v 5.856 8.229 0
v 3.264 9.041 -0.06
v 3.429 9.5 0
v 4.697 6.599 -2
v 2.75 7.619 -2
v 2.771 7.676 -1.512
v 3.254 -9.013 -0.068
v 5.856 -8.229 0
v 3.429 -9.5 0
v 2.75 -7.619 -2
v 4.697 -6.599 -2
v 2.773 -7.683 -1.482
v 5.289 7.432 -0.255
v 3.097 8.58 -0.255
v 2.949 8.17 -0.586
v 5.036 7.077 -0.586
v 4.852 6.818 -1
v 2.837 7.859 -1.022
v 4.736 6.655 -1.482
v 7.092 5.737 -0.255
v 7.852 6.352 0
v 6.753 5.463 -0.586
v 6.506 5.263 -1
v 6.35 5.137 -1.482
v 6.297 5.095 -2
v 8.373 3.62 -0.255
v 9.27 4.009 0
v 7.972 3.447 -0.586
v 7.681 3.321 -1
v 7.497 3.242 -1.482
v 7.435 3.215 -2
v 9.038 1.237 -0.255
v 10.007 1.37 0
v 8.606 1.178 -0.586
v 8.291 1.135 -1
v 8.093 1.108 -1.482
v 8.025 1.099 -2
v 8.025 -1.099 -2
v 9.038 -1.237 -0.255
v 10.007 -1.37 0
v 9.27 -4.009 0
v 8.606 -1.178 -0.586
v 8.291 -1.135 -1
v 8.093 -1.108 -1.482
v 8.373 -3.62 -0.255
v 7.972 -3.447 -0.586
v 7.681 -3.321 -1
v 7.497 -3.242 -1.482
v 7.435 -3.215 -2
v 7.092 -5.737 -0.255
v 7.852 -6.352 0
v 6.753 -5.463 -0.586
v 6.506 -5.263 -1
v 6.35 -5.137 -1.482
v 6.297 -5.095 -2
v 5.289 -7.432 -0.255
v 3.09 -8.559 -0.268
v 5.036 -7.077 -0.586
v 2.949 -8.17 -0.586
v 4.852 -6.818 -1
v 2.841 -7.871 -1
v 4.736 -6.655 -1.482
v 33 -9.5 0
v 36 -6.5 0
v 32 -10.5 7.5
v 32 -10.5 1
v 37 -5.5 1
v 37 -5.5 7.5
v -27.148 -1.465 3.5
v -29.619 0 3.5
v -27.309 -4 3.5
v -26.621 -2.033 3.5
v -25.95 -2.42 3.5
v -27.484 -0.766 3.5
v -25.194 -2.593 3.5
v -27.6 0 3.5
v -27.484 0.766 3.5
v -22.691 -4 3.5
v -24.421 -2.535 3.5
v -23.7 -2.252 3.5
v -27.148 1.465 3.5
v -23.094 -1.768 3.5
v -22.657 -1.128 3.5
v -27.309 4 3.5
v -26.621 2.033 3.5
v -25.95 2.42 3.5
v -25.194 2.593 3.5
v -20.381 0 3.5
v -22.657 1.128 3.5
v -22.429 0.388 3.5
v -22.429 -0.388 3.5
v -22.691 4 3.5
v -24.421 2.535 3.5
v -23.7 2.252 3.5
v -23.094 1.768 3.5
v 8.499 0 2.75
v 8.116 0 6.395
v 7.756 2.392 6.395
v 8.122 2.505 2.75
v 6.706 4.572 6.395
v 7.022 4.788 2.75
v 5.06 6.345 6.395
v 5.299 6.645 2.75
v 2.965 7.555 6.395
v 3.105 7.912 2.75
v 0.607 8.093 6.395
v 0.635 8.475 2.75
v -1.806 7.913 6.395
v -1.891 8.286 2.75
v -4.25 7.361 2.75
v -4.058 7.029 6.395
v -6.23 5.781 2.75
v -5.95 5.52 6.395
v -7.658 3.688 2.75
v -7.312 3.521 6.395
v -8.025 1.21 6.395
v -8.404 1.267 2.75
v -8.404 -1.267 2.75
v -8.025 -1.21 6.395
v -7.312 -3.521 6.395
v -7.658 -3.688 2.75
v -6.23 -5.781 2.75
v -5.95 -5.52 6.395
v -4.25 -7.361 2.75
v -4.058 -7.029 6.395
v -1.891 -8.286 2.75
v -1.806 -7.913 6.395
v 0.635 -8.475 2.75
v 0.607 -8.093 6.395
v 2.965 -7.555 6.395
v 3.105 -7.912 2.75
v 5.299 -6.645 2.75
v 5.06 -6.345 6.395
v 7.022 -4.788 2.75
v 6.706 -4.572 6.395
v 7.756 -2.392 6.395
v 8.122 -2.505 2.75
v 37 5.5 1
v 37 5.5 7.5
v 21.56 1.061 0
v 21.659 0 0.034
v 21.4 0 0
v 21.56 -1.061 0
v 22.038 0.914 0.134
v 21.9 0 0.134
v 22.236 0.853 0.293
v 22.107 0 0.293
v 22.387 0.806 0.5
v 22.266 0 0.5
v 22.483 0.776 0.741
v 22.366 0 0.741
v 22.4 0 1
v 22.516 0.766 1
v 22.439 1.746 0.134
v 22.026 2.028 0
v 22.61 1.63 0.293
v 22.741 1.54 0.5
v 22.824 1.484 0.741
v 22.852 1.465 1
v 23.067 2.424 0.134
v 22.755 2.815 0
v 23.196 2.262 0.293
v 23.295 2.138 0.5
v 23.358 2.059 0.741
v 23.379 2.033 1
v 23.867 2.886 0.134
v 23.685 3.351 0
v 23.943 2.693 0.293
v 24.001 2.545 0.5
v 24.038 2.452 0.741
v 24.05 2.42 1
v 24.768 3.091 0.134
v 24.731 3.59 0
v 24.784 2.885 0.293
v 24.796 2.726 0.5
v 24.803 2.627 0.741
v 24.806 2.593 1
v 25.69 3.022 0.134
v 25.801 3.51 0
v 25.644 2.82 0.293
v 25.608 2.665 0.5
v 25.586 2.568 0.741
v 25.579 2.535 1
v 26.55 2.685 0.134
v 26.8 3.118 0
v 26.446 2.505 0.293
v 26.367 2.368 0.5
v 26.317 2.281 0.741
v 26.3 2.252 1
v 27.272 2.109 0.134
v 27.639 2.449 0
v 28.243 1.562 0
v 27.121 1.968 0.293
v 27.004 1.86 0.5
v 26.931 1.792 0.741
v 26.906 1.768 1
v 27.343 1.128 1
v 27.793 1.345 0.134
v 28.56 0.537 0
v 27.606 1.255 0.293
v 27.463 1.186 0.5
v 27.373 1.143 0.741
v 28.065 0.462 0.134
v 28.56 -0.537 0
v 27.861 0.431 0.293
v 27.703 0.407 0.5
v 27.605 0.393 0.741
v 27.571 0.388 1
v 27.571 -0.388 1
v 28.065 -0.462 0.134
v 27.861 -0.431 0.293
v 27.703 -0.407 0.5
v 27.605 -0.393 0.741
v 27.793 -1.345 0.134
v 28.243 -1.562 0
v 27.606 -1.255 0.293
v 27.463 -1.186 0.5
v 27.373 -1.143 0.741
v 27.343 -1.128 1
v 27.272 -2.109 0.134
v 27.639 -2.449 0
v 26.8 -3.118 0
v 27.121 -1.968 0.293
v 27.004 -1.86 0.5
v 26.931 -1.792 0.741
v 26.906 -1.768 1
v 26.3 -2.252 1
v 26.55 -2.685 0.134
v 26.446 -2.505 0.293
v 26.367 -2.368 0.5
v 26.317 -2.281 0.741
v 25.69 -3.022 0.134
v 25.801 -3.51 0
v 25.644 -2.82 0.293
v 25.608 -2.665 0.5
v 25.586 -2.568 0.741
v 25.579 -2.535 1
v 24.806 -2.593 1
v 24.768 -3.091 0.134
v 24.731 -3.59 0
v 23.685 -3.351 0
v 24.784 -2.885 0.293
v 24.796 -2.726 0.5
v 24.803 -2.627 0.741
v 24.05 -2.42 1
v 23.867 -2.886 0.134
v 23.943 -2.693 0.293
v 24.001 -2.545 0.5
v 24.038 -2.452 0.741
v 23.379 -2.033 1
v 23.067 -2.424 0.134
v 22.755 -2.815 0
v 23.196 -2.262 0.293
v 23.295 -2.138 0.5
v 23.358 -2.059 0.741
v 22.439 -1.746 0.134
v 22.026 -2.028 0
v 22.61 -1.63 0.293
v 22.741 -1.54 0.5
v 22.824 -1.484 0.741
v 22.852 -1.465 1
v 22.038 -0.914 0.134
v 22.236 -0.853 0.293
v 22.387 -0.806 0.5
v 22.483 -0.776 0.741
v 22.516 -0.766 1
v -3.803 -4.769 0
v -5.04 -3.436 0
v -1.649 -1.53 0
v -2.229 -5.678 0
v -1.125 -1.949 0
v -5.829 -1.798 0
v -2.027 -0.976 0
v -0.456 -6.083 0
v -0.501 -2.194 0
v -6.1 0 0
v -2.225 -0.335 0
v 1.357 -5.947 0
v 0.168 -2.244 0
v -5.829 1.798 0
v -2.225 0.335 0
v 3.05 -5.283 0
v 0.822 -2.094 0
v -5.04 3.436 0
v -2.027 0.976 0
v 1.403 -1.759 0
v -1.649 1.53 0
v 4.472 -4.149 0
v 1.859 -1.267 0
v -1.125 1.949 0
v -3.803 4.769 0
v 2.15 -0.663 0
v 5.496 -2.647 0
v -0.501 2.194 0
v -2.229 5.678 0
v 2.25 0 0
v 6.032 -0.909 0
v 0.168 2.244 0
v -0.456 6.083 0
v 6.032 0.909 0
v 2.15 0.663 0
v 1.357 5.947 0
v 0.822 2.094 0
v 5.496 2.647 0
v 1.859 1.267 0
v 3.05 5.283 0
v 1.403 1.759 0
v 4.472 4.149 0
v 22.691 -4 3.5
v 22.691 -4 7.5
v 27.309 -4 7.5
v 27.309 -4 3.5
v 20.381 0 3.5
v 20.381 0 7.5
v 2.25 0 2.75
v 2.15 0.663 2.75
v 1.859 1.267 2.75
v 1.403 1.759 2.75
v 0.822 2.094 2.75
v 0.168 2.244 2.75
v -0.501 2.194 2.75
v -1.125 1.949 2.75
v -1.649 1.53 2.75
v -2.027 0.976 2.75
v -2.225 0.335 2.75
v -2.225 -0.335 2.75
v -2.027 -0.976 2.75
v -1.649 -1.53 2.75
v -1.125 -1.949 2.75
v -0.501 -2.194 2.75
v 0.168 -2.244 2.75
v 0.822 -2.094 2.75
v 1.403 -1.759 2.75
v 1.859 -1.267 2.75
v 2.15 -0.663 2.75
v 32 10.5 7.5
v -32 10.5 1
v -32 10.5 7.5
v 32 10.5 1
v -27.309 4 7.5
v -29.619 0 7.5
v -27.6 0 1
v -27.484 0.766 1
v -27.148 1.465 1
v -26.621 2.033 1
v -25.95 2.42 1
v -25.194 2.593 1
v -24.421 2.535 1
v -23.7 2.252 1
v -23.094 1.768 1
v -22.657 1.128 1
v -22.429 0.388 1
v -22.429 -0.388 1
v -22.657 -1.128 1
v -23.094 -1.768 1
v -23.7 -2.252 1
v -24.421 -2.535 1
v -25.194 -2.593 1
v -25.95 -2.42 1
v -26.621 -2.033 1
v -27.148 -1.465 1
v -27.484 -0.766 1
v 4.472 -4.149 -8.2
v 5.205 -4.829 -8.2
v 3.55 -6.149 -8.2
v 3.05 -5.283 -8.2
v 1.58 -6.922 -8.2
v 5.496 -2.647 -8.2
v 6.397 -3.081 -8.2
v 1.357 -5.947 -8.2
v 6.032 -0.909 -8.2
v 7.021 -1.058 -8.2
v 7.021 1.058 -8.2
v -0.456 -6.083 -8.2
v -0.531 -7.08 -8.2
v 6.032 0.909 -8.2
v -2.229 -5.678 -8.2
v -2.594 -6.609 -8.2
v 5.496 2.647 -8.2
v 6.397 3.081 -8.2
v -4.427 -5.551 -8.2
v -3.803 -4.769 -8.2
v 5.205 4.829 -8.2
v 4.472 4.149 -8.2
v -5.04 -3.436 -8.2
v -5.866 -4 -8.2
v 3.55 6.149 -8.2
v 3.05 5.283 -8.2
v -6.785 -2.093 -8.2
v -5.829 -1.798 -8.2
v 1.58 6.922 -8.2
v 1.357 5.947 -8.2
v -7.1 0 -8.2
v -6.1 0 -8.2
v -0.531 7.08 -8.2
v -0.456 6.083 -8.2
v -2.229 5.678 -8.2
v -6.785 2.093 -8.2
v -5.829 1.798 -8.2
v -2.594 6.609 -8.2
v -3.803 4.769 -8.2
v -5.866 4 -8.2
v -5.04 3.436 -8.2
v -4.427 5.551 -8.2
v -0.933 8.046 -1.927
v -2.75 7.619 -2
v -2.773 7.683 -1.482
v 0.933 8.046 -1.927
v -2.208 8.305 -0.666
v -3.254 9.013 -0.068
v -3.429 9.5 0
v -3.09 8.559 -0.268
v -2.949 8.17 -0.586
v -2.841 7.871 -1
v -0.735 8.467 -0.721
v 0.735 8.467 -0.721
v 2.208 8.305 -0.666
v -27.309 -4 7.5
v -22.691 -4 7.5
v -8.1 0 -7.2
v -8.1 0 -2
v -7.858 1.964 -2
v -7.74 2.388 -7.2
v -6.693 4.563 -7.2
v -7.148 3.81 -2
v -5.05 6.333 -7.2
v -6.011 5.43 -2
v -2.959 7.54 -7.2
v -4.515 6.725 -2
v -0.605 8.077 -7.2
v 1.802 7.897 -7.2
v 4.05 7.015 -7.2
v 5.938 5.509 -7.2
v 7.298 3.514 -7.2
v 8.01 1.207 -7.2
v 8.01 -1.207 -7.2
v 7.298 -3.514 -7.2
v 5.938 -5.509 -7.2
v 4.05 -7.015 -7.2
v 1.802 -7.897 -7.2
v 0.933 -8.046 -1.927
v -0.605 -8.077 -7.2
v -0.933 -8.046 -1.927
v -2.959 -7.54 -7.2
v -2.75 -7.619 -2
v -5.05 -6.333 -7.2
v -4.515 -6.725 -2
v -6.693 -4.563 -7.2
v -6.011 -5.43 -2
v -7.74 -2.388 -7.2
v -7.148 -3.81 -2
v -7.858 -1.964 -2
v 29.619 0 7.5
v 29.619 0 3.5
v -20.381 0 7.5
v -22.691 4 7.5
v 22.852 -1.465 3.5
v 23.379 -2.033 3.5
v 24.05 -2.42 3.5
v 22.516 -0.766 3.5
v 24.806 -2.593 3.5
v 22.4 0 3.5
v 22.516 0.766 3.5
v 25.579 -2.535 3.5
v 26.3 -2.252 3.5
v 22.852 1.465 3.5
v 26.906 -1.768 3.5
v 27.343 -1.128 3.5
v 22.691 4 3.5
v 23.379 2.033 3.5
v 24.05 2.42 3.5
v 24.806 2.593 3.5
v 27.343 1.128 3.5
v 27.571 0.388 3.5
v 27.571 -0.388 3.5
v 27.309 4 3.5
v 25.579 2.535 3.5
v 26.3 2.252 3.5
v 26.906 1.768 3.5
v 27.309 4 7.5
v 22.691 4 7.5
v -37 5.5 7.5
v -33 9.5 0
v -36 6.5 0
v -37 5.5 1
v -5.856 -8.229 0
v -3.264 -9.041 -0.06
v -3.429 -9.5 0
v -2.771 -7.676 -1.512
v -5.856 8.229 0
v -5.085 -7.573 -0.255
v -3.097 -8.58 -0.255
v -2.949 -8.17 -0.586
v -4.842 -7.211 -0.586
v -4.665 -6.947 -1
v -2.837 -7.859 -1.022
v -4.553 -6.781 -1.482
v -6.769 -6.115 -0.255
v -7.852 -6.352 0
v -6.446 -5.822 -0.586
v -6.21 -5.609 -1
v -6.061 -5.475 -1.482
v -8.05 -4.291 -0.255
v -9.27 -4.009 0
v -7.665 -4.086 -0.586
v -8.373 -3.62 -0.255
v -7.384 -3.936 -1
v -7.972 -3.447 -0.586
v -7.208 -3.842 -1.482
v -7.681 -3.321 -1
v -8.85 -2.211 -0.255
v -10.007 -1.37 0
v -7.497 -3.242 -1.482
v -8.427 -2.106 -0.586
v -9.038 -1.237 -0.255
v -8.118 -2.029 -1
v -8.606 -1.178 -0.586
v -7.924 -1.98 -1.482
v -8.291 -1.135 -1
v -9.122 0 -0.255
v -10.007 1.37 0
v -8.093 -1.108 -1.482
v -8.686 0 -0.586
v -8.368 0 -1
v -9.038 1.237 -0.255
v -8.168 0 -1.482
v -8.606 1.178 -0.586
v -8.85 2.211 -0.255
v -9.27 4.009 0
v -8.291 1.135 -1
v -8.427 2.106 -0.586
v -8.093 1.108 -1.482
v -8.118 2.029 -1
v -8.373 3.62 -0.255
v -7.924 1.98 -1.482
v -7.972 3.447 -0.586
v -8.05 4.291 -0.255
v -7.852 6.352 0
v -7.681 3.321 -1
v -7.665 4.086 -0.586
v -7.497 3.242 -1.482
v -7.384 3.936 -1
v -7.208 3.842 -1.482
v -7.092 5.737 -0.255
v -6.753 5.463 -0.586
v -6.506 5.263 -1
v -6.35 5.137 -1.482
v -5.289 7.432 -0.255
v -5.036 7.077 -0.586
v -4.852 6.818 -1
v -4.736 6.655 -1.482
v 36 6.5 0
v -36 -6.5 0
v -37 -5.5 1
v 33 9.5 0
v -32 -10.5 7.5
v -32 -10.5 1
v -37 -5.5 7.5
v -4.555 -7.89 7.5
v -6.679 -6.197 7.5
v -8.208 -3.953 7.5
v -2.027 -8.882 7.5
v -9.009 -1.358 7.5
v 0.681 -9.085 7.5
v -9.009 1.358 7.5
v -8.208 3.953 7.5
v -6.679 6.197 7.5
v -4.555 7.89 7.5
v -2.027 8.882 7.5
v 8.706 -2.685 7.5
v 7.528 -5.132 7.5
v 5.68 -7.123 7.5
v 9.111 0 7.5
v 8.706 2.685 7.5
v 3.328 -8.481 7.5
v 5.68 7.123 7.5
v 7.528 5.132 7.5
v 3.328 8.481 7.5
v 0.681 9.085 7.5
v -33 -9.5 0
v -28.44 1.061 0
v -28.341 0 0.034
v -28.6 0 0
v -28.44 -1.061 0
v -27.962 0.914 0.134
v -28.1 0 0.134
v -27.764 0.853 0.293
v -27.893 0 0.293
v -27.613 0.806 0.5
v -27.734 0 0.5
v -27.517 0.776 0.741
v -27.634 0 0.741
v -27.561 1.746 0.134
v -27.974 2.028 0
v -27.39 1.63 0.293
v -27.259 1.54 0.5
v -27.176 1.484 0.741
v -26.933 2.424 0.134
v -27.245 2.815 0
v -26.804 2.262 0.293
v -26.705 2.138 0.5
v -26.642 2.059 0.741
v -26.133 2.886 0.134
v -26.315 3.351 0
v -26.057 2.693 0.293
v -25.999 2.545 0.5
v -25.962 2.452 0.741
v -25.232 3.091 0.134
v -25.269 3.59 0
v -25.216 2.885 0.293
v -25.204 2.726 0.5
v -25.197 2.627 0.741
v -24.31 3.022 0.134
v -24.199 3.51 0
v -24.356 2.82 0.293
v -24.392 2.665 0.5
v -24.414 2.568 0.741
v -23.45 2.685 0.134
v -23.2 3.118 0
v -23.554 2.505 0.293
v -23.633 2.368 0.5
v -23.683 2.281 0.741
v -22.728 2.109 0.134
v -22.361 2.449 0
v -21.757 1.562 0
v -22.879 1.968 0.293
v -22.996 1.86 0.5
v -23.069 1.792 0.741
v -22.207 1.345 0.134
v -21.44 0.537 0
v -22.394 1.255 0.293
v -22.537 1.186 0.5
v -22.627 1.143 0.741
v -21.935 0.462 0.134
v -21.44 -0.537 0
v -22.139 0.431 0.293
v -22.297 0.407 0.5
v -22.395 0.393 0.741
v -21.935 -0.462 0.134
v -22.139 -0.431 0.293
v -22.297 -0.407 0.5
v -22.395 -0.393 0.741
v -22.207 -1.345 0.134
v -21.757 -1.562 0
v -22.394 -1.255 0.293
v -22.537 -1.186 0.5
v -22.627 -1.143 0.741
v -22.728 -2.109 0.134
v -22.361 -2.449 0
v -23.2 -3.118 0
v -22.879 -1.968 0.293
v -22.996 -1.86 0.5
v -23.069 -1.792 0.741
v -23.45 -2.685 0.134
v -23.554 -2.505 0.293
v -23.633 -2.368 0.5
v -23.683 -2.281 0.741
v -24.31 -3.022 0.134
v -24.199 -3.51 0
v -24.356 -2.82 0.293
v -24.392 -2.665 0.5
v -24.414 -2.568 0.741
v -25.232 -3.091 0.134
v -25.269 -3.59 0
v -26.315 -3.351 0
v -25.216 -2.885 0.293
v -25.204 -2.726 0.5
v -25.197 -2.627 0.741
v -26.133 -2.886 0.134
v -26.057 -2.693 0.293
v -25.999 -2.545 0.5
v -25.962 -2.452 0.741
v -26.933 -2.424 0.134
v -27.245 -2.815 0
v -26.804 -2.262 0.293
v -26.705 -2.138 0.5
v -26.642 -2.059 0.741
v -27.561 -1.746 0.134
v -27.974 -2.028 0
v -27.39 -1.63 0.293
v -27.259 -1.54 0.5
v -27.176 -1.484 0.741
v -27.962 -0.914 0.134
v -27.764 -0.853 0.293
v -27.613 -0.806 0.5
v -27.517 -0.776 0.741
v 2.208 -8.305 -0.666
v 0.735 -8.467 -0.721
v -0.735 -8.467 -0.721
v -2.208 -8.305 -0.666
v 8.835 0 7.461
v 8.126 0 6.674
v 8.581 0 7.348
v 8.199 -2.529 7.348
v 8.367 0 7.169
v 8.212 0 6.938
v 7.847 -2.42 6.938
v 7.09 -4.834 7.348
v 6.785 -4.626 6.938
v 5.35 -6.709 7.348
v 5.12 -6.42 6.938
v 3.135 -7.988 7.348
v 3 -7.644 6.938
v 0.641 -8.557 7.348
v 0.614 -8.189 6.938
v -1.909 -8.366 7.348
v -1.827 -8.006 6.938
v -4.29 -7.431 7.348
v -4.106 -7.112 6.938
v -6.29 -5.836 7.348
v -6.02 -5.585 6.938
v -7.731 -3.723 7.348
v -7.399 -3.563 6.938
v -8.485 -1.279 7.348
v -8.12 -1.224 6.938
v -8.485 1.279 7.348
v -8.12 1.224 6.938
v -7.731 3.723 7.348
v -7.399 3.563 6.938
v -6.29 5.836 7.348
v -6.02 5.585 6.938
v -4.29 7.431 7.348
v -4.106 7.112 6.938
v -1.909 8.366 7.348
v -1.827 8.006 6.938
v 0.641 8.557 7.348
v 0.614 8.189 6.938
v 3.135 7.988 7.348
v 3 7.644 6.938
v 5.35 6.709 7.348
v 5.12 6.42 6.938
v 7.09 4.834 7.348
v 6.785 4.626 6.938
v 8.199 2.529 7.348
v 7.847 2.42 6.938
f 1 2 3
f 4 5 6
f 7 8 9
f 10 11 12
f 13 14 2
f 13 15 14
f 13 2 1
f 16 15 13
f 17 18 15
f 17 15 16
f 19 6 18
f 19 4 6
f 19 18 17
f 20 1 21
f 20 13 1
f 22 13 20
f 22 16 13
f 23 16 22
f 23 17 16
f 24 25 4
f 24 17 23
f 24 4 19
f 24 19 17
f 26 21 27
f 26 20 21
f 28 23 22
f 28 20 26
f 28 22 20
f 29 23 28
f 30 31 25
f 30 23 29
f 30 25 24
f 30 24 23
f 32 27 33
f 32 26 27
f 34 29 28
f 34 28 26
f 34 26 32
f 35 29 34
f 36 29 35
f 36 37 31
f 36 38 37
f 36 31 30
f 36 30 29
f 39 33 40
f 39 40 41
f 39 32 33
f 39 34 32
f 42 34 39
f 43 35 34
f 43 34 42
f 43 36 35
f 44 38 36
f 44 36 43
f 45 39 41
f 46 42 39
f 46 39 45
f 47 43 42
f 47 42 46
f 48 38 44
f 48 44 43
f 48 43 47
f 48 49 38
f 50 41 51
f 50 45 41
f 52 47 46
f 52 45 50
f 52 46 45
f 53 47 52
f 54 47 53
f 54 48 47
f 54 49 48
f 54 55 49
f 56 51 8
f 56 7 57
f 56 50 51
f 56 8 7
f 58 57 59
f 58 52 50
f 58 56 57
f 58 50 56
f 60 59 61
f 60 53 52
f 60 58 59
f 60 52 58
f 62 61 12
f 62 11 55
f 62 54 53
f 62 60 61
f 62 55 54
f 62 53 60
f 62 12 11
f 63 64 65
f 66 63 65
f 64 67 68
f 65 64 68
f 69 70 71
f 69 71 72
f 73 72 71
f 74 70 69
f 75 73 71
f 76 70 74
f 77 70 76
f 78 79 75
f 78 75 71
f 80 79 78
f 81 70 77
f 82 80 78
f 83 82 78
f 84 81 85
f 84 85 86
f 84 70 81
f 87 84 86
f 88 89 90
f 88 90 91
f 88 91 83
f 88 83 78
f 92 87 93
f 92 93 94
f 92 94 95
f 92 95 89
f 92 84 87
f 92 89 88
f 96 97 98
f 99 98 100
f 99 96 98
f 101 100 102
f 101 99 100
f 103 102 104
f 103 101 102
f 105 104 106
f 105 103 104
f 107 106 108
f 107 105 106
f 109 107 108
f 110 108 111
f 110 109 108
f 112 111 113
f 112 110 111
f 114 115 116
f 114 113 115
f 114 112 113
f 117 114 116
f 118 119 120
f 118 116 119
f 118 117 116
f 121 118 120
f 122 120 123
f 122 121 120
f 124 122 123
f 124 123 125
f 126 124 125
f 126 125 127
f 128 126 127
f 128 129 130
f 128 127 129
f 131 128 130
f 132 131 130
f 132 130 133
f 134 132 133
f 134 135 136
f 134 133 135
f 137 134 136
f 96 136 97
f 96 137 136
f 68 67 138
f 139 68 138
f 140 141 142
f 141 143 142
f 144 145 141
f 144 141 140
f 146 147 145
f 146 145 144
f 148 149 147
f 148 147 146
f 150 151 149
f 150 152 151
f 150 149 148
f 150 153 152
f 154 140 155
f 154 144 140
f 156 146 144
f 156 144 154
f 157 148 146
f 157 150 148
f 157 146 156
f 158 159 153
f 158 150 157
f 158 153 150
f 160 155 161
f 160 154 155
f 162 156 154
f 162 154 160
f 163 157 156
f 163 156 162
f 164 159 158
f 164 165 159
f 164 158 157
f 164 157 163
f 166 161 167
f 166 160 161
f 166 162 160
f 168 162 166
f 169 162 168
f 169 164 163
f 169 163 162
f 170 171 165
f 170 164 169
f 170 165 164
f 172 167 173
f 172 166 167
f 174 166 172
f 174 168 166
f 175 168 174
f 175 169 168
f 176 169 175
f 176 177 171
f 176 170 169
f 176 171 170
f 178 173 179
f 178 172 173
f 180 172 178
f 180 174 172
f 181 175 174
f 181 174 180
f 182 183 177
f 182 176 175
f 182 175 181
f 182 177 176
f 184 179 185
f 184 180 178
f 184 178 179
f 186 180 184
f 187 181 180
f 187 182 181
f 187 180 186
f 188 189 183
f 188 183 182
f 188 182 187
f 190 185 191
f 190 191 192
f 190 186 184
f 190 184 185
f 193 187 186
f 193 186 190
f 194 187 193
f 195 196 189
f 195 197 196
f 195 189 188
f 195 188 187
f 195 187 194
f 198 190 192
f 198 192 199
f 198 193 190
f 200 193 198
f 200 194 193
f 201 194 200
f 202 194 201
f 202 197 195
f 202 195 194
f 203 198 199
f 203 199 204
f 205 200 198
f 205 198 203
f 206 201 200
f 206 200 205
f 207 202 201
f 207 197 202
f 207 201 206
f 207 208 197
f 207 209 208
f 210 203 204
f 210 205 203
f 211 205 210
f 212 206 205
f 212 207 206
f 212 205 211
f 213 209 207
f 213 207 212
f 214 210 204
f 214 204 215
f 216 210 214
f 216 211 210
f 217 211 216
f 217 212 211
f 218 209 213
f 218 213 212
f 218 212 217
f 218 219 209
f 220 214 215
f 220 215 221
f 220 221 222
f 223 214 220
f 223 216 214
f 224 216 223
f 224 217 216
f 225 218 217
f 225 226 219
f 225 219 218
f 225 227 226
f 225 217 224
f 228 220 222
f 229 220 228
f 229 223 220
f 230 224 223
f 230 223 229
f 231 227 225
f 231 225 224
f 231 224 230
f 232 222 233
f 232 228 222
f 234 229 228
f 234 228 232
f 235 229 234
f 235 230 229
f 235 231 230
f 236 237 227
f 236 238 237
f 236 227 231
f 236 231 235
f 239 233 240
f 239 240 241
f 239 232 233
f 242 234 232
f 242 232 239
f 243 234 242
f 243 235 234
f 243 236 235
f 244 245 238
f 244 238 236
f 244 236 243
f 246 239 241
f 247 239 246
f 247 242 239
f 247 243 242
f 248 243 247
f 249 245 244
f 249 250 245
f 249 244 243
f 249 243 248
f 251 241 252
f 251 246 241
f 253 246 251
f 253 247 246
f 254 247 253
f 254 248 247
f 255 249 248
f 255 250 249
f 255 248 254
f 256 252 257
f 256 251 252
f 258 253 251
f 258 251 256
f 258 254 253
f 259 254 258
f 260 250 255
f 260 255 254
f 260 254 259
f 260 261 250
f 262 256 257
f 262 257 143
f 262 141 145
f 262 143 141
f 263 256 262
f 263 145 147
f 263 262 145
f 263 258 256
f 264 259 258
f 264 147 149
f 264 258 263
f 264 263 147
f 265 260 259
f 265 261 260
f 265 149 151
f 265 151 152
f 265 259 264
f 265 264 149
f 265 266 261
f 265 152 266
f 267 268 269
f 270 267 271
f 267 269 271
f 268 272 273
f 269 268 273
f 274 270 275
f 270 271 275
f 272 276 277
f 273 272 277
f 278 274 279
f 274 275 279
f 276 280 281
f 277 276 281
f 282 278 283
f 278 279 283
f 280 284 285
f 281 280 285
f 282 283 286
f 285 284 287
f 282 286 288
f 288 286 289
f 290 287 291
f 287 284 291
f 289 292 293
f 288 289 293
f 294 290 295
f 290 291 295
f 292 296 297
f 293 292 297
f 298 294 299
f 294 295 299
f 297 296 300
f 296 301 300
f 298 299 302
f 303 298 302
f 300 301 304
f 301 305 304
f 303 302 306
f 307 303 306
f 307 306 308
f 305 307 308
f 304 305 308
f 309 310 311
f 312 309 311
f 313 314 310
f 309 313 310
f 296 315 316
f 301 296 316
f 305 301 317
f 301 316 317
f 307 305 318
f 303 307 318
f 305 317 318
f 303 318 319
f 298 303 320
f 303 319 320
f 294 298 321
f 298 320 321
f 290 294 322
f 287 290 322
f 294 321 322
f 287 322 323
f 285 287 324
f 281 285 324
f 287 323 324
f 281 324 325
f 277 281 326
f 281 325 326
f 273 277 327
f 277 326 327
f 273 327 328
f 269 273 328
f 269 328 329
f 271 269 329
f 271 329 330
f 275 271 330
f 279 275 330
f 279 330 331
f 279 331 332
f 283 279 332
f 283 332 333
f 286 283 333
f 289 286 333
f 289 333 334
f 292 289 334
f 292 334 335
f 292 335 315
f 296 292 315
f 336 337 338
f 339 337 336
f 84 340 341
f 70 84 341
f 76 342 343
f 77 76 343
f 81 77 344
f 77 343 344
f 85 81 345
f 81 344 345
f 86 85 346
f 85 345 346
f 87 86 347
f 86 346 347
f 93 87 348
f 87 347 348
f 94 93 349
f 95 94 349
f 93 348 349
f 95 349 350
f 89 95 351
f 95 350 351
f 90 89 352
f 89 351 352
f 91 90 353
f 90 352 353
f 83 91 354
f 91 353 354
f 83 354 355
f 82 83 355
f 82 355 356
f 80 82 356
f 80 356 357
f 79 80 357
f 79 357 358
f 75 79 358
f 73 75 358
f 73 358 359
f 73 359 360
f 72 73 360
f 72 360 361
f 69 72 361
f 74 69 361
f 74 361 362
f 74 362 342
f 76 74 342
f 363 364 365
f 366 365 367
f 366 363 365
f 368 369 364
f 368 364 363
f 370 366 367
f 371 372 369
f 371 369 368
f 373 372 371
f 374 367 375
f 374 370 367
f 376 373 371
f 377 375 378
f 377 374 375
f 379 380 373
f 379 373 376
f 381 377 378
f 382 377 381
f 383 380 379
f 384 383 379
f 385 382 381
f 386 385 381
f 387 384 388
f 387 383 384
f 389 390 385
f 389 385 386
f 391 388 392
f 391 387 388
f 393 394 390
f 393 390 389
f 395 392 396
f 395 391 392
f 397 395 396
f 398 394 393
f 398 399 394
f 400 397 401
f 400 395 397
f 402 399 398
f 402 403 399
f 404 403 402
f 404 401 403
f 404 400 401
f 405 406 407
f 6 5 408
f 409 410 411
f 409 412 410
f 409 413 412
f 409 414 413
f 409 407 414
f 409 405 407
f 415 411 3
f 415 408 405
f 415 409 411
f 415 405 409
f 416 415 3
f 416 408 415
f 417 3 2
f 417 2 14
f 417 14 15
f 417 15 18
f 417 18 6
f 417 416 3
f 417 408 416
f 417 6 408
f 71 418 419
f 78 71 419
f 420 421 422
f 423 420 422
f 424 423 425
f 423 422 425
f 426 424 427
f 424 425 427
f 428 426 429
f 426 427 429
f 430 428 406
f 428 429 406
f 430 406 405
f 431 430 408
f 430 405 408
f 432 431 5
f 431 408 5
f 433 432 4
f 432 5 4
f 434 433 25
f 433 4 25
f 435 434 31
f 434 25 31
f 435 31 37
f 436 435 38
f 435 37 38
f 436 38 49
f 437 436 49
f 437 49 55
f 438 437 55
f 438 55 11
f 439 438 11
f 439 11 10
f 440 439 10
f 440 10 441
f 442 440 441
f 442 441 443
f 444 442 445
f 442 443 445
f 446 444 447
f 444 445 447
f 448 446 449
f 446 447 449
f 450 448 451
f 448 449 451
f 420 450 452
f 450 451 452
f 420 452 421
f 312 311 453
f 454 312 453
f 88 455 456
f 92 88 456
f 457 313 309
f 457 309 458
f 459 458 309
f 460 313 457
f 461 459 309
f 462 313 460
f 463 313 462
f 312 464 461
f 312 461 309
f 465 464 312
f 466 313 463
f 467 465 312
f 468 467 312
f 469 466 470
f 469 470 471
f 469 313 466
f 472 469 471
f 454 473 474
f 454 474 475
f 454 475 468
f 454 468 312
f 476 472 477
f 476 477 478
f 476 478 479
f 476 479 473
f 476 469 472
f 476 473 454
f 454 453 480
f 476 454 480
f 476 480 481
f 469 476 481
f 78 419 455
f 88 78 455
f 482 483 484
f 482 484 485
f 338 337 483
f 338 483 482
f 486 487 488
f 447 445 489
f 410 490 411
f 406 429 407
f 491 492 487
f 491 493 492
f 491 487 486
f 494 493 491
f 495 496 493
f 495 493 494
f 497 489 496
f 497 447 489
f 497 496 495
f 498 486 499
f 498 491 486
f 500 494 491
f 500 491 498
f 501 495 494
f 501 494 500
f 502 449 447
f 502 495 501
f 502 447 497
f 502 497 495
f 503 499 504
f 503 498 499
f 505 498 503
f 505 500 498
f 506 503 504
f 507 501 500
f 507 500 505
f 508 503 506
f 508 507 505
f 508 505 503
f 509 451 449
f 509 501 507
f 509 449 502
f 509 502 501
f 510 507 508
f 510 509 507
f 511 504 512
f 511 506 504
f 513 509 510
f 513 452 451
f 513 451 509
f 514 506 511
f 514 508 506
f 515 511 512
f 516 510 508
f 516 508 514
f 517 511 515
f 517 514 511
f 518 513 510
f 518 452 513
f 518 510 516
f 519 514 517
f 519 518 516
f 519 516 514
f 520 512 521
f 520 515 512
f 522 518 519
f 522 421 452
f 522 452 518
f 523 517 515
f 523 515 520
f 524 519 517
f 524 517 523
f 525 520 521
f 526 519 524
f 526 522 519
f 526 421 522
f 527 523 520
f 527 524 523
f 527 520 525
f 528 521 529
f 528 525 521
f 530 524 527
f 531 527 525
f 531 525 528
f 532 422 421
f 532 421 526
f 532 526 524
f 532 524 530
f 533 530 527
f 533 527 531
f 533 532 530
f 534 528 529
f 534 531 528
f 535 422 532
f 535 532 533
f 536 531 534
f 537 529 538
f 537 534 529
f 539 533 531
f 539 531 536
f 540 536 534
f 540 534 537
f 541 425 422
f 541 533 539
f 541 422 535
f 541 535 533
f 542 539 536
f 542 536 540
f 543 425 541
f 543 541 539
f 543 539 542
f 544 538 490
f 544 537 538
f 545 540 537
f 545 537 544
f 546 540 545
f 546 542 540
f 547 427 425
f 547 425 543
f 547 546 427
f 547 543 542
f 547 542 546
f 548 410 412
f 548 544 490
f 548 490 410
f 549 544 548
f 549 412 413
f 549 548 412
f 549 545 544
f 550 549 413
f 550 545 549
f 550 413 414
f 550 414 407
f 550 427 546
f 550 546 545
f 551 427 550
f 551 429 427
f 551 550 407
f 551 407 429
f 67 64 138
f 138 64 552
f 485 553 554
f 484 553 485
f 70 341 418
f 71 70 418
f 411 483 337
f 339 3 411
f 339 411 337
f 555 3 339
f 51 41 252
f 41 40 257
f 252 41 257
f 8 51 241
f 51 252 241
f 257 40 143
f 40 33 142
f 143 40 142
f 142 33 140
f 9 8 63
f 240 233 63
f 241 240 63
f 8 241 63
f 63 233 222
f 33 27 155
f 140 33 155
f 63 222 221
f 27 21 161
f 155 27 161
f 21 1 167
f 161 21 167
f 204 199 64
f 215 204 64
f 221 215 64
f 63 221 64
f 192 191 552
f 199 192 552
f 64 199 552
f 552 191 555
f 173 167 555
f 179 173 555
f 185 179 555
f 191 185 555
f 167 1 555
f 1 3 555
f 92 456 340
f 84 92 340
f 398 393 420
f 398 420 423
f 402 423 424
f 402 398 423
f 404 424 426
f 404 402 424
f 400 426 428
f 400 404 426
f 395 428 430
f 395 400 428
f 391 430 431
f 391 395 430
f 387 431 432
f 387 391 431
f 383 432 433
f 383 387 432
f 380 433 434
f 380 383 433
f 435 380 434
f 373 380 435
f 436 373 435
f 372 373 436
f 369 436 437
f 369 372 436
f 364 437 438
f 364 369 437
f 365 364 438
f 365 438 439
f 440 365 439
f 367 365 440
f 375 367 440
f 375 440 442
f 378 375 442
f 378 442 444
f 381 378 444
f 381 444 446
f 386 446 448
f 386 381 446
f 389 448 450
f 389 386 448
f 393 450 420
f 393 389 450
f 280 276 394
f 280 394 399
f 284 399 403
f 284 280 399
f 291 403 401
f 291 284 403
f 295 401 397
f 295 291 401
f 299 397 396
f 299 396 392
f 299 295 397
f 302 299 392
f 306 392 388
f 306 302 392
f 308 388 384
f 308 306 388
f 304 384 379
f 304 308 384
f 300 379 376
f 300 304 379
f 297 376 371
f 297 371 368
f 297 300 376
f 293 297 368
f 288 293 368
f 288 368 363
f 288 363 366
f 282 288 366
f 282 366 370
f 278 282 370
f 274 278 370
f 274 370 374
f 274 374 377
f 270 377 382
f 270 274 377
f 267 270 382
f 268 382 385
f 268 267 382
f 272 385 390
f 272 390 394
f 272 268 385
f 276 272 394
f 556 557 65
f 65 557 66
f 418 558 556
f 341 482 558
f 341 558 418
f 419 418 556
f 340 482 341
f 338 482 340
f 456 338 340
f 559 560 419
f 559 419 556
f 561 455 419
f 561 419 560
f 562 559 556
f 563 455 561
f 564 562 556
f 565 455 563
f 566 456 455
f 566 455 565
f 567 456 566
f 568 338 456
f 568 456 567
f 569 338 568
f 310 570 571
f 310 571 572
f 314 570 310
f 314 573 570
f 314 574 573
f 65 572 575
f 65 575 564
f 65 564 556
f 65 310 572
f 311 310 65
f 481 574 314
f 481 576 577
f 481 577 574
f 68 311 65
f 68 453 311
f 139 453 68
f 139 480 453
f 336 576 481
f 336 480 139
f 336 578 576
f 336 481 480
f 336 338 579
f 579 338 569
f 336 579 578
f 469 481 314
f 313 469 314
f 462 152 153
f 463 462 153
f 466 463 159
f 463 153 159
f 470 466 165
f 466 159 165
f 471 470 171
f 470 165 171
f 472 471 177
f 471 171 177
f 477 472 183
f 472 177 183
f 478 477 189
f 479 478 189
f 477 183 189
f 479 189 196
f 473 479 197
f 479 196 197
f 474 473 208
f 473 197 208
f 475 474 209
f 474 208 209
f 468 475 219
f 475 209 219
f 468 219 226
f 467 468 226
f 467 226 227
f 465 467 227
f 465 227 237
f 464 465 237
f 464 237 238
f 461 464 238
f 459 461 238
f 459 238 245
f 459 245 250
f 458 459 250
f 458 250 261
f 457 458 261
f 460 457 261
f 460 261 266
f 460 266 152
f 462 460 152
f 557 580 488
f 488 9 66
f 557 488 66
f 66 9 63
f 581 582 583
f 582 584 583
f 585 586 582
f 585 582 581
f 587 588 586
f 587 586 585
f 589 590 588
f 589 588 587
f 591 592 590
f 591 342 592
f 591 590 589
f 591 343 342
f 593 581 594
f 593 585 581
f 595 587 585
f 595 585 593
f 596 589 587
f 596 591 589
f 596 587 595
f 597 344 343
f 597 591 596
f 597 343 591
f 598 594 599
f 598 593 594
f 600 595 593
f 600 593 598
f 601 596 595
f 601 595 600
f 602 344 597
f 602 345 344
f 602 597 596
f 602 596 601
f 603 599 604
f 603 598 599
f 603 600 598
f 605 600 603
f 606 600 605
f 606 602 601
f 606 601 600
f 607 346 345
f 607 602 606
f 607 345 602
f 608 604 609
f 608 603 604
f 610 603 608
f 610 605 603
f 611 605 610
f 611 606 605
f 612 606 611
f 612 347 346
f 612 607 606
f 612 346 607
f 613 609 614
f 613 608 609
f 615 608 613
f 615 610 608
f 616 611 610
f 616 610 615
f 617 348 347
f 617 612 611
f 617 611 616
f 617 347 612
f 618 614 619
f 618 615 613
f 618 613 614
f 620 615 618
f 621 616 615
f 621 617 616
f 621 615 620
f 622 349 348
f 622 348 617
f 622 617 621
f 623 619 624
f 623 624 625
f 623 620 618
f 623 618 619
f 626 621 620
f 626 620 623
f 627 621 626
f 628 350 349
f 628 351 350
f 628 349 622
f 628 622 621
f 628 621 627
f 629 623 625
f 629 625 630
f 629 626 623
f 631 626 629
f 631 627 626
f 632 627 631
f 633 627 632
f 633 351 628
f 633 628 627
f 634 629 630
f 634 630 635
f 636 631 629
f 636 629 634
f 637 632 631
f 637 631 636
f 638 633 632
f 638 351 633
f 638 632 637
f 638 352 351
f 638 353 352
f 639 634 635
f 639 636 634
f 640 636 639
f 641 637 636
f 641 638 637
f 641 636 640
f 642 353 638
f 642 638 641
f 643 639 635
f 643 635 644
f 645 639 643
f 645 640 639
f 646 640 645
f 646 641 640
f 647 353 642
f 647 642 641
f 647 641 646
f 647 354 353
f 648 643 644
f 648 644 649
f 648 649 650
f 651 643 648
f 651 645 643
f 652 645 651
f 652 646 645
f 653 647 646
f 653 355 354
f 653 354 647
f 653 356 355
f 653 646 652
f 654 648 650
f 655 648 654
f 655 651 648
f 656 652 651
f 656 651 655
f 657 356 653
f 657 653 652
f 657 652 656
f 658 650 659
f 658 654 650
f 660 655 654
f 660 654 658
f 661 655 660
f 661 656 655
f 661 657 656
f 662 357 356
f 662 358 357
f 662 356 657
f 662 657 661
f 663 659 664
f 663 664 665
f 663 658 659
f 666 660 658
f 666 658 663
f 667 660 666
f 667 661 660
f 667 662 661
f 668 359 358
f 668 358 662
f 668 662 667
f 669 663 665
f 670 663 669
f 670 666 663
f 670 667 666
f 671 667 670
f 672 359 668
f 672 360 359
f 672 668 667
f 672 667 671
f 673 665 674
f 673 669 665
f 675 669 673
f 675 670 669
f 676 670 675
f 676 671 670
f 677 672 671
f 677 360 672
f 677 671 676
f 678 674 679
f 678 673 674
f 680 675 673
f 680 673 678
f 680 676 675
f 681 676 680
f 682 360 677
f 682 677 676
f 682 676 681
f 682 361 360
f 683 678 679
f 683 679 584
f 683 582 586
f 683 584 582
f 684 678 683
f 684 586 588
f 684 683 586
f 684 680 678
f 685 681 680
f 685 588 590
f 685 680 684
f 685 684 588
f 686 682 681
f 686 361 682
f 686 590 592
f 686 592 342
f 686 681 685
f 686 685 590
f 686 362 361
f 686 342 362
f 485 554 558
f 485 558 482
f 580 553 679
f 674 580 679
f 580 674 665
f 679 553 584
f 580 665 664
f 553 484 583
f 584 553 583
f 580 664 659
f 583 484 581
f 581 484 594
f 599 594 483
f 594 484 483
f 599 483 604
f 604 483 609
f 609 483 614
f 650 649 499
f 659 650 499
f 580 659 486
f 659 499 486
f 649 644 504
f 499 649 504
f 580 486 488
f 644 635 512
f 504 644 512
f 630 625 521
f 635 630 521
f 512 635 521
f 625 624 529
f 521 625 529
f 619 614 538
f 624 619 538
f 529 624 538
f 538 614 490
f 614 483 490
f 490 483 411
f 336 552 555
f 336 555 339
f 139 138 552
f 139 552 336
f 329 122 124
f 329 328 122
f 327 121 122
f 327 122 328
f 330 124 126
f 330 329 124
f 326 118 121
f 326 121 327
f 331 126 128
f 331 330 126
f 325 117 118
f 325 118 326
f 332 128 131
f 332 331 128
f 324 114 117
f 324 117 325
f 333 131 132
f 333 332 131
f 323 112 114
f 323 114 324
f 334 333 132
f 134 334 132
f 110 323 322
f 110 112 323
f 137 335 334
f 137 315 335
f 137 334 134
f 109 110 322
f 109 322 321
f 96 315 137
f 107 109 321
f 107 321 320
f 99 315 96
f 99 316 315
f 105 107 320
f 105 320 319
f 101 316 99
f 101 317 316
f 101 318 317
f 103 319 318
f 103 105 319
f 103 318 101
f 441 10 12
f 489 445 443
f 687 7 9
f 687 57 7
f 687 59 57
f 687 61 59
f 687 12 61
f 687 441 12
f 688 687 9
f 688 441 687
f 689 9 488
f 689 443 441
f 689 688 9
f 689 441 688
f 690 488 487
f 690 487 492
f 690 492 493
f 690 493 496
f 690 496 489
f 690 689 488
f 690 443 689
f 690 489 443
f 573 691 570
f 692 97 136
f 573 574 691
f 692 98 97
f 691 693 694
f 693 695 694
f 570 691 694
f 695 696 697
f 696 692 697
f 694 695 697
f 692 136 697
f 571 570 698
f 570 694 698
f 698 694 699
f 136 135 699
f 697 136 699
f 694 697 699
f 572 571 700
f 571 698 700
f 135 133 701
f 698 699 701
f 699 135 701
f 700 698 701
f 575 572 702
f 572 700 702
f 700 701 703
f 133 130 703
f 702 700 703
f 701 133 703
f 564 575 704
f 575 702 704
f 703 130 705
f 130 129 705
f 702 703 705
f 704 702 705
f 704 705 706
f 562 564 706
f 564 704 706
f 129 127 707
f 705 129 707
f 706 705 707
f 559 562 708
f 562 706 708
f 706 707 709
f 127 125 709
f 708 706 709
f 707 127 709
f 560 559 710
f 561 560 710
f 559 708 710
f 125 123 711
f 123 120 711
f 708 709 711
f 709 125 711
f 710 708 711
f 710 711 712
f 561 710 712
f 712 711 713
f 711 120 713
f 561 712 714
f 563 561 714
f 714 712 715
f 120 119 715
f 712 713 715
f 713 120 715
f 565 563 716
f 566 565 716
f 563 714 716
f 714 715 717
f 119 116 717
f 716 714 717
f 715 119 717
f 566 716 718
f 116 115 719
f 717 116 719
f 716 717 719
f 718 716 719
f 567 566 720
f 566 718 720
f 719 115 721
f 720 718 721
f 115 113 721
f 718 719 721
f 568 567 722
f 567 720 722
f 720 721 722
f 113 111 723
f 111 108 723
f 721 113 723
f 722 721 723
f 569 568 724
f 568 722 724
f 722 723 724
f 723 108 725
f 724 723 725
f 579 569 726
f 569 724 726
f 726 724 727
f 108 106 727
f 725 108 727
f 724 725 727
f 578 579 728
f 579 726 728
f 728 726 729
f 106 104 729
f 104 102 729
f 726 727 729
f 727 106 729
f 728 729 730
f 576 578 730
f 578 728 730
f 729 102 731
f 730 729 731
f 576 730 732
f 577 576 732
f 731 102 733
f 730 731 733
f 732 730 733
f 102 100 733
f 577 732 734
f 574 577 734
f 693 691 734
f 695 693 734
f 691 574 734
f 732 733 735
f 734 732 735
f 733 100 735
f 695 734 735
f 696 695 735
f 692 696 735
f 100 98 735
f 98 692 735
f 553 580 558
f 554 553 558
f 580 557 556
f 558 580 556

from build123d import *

# Parameters (mm, degrees)
SKETCH1_W           = 74
SKETCH1_H           = 21
BOSS_EXTRUDE1_DEPTH = 7.5
SKETCH2_R           = 8
CUT_EXTRUDE1_DEPTH  = 4.75
CUT_EXTRUDE1_TAPER  = -6
SKETCH4_R           = 2.6
CUT_EXTRUDE4_DEPTH  = 8.5000001
CHAMFER3_SIZE       = 5
CUT_EXTRUDE6_DEPTH  = 4
SKETCH11_R          = 2.25
CUT_EXTRUDE10_DEPTH = 8.5
FILLET4_R           = 1
FILLET5_R           = 1
CHAMFER5_SIZE       = 1
SKETCH12_R          = 8.1
SKETCH12_R_2        = 6.1
EXTRUDE_THIN1_DEPTH = 8.2
FILLET6_R           = 2
CHAMFER6_SIZE       = 1


with BuildPart() as part:
    # Sketch1 → Boss-Extrude1 (new body)
    with BuildSketch(Plane.XY):
        Rectangle(SKETCH1_W, SKETCH1_H)
    extrude(amount=BOSS_EXTRUDE1_DEPTH)

    # Sketch2 → Cut-Extrude1 (cut)
    with BuildSketch(Plane.XY.offset(7.5)):
        Circle(SKETCH2_R)
    extrude(amount=-CUT_EXTRUDE1_DEPTH, taper=CUT_EXTRUDE1_TAPER, mode=Mode.SUBTRACT)

    # Sketch4 → Cut-Extrude4 (cut, through all)
    with BuildSketch(Plane(origin=(0, 0, 0), x_dir=(-1, 0, 0), z_dir=(0, 0, -1))):
        with Locations((-25, 0)):
            Circle(SKETCH4_R)
        with Locations((25, 0)):
            Circle(SKETCH4_R)
    extrude(amount=-CUT_EXTRUDE4_DEPTH, mode=Mode.SUBTRACT)

    # Chamfer3
    chamfer3_edges = [part.edges().sort_by_distance(p)[0] for p in [
        (37, -10.5, 3.75),
        (-37, -10.5, 3.75),
        (-37, 10.5, 3.75),
        (37, 10.5, 3.75),
    ]]
    chamfer(chamfer3_edges, length=CHAMFER3_SIZE)

    # Sketch5 → Cut-Extrude6 (cut)
    with BuildSketch(Plane.XY.offset(7.5)):
        Polygon((22.690598923, -4), (27.309401077, -4), (29.618802154, 0), (27.309401077, 4), (22.690598923, 4), (20.381197846, 0), align=None)
        Polygon((-27.309401077, -4), (-22.690598923, -4), (-20.381197846, 0), (-22.690598923, 4), (-27.309401077, 4), (-29.618802154, 0), align=None)
    extrude(amount=-CUT_EXTRUDE6_DEPTH, mode=Mode.SUBTRACT)

    # Sketch11 → Cut-Extrude10 (cut, through all)
    with BuildSketch(Plane.XY.offset(7.5)):
        Circle(SKETCH11_R)
    extrude(amount=-CUT_EXTRUDE10_DEPTH, mode=Mode.SUBTRACT)

    # Fillet4
    fillet4_edges = [part.edges().sort_by_distance(p)[0] for p in [
        (27.6, 0, 0),
        (-22.4, 0, 0),
    ]]
    fillet(fillet4_edges, radius=FILLET4_R)

    # Fillet5
    fillet5_edges = [part.edges().sort_by_distance(p)[0] for p in [
        (-8, 0, 7.5),
    ]]
    fillet(fillet5_edges, radius=FILLET5_R)

    # Chamfer5
    chamfer5_edges = [part.edges().sort_by_distance(p)[0] for p in [
        (-37, 0, 0),
        (37, 0, 0),
        (0, -10.5, 0),
        (0, 10.5, 0),
    ]]
    chamfer(chamfer5_edges, length=CHAMFER5_SIZE)

    # Sketch12 → Extrude-Thin1 (add)
    with BuildSketch(Plane(origin=(0, 0, 0), x_dir=(-1, 0, 0), z_dir=(0, 0, -1))):
        Circle(SKETCH12_R)
        Circle(SKETCH12_R_2, mode=Mode.SUBTRACT)
    extrude(amount=EXTRUDE_THIN1_DEPTH)

    # Fillet6
    fillet6_edges = [part.edges().sort_by_distance(p)[0] for p in [
        (8.1, 0, 0),
    ]]
    fillet(fillet6_edges, radius=FILLET6_R)

    # Chamfer6
    chamfer6_edges = [part.edges().sort_by_distance(p)[0] for p in [
        (8.1, 0, -8.2),
    ]]
    chamfer(chamfer6_edges, length=CHAMFER6_SIZE)


solid = part.part
